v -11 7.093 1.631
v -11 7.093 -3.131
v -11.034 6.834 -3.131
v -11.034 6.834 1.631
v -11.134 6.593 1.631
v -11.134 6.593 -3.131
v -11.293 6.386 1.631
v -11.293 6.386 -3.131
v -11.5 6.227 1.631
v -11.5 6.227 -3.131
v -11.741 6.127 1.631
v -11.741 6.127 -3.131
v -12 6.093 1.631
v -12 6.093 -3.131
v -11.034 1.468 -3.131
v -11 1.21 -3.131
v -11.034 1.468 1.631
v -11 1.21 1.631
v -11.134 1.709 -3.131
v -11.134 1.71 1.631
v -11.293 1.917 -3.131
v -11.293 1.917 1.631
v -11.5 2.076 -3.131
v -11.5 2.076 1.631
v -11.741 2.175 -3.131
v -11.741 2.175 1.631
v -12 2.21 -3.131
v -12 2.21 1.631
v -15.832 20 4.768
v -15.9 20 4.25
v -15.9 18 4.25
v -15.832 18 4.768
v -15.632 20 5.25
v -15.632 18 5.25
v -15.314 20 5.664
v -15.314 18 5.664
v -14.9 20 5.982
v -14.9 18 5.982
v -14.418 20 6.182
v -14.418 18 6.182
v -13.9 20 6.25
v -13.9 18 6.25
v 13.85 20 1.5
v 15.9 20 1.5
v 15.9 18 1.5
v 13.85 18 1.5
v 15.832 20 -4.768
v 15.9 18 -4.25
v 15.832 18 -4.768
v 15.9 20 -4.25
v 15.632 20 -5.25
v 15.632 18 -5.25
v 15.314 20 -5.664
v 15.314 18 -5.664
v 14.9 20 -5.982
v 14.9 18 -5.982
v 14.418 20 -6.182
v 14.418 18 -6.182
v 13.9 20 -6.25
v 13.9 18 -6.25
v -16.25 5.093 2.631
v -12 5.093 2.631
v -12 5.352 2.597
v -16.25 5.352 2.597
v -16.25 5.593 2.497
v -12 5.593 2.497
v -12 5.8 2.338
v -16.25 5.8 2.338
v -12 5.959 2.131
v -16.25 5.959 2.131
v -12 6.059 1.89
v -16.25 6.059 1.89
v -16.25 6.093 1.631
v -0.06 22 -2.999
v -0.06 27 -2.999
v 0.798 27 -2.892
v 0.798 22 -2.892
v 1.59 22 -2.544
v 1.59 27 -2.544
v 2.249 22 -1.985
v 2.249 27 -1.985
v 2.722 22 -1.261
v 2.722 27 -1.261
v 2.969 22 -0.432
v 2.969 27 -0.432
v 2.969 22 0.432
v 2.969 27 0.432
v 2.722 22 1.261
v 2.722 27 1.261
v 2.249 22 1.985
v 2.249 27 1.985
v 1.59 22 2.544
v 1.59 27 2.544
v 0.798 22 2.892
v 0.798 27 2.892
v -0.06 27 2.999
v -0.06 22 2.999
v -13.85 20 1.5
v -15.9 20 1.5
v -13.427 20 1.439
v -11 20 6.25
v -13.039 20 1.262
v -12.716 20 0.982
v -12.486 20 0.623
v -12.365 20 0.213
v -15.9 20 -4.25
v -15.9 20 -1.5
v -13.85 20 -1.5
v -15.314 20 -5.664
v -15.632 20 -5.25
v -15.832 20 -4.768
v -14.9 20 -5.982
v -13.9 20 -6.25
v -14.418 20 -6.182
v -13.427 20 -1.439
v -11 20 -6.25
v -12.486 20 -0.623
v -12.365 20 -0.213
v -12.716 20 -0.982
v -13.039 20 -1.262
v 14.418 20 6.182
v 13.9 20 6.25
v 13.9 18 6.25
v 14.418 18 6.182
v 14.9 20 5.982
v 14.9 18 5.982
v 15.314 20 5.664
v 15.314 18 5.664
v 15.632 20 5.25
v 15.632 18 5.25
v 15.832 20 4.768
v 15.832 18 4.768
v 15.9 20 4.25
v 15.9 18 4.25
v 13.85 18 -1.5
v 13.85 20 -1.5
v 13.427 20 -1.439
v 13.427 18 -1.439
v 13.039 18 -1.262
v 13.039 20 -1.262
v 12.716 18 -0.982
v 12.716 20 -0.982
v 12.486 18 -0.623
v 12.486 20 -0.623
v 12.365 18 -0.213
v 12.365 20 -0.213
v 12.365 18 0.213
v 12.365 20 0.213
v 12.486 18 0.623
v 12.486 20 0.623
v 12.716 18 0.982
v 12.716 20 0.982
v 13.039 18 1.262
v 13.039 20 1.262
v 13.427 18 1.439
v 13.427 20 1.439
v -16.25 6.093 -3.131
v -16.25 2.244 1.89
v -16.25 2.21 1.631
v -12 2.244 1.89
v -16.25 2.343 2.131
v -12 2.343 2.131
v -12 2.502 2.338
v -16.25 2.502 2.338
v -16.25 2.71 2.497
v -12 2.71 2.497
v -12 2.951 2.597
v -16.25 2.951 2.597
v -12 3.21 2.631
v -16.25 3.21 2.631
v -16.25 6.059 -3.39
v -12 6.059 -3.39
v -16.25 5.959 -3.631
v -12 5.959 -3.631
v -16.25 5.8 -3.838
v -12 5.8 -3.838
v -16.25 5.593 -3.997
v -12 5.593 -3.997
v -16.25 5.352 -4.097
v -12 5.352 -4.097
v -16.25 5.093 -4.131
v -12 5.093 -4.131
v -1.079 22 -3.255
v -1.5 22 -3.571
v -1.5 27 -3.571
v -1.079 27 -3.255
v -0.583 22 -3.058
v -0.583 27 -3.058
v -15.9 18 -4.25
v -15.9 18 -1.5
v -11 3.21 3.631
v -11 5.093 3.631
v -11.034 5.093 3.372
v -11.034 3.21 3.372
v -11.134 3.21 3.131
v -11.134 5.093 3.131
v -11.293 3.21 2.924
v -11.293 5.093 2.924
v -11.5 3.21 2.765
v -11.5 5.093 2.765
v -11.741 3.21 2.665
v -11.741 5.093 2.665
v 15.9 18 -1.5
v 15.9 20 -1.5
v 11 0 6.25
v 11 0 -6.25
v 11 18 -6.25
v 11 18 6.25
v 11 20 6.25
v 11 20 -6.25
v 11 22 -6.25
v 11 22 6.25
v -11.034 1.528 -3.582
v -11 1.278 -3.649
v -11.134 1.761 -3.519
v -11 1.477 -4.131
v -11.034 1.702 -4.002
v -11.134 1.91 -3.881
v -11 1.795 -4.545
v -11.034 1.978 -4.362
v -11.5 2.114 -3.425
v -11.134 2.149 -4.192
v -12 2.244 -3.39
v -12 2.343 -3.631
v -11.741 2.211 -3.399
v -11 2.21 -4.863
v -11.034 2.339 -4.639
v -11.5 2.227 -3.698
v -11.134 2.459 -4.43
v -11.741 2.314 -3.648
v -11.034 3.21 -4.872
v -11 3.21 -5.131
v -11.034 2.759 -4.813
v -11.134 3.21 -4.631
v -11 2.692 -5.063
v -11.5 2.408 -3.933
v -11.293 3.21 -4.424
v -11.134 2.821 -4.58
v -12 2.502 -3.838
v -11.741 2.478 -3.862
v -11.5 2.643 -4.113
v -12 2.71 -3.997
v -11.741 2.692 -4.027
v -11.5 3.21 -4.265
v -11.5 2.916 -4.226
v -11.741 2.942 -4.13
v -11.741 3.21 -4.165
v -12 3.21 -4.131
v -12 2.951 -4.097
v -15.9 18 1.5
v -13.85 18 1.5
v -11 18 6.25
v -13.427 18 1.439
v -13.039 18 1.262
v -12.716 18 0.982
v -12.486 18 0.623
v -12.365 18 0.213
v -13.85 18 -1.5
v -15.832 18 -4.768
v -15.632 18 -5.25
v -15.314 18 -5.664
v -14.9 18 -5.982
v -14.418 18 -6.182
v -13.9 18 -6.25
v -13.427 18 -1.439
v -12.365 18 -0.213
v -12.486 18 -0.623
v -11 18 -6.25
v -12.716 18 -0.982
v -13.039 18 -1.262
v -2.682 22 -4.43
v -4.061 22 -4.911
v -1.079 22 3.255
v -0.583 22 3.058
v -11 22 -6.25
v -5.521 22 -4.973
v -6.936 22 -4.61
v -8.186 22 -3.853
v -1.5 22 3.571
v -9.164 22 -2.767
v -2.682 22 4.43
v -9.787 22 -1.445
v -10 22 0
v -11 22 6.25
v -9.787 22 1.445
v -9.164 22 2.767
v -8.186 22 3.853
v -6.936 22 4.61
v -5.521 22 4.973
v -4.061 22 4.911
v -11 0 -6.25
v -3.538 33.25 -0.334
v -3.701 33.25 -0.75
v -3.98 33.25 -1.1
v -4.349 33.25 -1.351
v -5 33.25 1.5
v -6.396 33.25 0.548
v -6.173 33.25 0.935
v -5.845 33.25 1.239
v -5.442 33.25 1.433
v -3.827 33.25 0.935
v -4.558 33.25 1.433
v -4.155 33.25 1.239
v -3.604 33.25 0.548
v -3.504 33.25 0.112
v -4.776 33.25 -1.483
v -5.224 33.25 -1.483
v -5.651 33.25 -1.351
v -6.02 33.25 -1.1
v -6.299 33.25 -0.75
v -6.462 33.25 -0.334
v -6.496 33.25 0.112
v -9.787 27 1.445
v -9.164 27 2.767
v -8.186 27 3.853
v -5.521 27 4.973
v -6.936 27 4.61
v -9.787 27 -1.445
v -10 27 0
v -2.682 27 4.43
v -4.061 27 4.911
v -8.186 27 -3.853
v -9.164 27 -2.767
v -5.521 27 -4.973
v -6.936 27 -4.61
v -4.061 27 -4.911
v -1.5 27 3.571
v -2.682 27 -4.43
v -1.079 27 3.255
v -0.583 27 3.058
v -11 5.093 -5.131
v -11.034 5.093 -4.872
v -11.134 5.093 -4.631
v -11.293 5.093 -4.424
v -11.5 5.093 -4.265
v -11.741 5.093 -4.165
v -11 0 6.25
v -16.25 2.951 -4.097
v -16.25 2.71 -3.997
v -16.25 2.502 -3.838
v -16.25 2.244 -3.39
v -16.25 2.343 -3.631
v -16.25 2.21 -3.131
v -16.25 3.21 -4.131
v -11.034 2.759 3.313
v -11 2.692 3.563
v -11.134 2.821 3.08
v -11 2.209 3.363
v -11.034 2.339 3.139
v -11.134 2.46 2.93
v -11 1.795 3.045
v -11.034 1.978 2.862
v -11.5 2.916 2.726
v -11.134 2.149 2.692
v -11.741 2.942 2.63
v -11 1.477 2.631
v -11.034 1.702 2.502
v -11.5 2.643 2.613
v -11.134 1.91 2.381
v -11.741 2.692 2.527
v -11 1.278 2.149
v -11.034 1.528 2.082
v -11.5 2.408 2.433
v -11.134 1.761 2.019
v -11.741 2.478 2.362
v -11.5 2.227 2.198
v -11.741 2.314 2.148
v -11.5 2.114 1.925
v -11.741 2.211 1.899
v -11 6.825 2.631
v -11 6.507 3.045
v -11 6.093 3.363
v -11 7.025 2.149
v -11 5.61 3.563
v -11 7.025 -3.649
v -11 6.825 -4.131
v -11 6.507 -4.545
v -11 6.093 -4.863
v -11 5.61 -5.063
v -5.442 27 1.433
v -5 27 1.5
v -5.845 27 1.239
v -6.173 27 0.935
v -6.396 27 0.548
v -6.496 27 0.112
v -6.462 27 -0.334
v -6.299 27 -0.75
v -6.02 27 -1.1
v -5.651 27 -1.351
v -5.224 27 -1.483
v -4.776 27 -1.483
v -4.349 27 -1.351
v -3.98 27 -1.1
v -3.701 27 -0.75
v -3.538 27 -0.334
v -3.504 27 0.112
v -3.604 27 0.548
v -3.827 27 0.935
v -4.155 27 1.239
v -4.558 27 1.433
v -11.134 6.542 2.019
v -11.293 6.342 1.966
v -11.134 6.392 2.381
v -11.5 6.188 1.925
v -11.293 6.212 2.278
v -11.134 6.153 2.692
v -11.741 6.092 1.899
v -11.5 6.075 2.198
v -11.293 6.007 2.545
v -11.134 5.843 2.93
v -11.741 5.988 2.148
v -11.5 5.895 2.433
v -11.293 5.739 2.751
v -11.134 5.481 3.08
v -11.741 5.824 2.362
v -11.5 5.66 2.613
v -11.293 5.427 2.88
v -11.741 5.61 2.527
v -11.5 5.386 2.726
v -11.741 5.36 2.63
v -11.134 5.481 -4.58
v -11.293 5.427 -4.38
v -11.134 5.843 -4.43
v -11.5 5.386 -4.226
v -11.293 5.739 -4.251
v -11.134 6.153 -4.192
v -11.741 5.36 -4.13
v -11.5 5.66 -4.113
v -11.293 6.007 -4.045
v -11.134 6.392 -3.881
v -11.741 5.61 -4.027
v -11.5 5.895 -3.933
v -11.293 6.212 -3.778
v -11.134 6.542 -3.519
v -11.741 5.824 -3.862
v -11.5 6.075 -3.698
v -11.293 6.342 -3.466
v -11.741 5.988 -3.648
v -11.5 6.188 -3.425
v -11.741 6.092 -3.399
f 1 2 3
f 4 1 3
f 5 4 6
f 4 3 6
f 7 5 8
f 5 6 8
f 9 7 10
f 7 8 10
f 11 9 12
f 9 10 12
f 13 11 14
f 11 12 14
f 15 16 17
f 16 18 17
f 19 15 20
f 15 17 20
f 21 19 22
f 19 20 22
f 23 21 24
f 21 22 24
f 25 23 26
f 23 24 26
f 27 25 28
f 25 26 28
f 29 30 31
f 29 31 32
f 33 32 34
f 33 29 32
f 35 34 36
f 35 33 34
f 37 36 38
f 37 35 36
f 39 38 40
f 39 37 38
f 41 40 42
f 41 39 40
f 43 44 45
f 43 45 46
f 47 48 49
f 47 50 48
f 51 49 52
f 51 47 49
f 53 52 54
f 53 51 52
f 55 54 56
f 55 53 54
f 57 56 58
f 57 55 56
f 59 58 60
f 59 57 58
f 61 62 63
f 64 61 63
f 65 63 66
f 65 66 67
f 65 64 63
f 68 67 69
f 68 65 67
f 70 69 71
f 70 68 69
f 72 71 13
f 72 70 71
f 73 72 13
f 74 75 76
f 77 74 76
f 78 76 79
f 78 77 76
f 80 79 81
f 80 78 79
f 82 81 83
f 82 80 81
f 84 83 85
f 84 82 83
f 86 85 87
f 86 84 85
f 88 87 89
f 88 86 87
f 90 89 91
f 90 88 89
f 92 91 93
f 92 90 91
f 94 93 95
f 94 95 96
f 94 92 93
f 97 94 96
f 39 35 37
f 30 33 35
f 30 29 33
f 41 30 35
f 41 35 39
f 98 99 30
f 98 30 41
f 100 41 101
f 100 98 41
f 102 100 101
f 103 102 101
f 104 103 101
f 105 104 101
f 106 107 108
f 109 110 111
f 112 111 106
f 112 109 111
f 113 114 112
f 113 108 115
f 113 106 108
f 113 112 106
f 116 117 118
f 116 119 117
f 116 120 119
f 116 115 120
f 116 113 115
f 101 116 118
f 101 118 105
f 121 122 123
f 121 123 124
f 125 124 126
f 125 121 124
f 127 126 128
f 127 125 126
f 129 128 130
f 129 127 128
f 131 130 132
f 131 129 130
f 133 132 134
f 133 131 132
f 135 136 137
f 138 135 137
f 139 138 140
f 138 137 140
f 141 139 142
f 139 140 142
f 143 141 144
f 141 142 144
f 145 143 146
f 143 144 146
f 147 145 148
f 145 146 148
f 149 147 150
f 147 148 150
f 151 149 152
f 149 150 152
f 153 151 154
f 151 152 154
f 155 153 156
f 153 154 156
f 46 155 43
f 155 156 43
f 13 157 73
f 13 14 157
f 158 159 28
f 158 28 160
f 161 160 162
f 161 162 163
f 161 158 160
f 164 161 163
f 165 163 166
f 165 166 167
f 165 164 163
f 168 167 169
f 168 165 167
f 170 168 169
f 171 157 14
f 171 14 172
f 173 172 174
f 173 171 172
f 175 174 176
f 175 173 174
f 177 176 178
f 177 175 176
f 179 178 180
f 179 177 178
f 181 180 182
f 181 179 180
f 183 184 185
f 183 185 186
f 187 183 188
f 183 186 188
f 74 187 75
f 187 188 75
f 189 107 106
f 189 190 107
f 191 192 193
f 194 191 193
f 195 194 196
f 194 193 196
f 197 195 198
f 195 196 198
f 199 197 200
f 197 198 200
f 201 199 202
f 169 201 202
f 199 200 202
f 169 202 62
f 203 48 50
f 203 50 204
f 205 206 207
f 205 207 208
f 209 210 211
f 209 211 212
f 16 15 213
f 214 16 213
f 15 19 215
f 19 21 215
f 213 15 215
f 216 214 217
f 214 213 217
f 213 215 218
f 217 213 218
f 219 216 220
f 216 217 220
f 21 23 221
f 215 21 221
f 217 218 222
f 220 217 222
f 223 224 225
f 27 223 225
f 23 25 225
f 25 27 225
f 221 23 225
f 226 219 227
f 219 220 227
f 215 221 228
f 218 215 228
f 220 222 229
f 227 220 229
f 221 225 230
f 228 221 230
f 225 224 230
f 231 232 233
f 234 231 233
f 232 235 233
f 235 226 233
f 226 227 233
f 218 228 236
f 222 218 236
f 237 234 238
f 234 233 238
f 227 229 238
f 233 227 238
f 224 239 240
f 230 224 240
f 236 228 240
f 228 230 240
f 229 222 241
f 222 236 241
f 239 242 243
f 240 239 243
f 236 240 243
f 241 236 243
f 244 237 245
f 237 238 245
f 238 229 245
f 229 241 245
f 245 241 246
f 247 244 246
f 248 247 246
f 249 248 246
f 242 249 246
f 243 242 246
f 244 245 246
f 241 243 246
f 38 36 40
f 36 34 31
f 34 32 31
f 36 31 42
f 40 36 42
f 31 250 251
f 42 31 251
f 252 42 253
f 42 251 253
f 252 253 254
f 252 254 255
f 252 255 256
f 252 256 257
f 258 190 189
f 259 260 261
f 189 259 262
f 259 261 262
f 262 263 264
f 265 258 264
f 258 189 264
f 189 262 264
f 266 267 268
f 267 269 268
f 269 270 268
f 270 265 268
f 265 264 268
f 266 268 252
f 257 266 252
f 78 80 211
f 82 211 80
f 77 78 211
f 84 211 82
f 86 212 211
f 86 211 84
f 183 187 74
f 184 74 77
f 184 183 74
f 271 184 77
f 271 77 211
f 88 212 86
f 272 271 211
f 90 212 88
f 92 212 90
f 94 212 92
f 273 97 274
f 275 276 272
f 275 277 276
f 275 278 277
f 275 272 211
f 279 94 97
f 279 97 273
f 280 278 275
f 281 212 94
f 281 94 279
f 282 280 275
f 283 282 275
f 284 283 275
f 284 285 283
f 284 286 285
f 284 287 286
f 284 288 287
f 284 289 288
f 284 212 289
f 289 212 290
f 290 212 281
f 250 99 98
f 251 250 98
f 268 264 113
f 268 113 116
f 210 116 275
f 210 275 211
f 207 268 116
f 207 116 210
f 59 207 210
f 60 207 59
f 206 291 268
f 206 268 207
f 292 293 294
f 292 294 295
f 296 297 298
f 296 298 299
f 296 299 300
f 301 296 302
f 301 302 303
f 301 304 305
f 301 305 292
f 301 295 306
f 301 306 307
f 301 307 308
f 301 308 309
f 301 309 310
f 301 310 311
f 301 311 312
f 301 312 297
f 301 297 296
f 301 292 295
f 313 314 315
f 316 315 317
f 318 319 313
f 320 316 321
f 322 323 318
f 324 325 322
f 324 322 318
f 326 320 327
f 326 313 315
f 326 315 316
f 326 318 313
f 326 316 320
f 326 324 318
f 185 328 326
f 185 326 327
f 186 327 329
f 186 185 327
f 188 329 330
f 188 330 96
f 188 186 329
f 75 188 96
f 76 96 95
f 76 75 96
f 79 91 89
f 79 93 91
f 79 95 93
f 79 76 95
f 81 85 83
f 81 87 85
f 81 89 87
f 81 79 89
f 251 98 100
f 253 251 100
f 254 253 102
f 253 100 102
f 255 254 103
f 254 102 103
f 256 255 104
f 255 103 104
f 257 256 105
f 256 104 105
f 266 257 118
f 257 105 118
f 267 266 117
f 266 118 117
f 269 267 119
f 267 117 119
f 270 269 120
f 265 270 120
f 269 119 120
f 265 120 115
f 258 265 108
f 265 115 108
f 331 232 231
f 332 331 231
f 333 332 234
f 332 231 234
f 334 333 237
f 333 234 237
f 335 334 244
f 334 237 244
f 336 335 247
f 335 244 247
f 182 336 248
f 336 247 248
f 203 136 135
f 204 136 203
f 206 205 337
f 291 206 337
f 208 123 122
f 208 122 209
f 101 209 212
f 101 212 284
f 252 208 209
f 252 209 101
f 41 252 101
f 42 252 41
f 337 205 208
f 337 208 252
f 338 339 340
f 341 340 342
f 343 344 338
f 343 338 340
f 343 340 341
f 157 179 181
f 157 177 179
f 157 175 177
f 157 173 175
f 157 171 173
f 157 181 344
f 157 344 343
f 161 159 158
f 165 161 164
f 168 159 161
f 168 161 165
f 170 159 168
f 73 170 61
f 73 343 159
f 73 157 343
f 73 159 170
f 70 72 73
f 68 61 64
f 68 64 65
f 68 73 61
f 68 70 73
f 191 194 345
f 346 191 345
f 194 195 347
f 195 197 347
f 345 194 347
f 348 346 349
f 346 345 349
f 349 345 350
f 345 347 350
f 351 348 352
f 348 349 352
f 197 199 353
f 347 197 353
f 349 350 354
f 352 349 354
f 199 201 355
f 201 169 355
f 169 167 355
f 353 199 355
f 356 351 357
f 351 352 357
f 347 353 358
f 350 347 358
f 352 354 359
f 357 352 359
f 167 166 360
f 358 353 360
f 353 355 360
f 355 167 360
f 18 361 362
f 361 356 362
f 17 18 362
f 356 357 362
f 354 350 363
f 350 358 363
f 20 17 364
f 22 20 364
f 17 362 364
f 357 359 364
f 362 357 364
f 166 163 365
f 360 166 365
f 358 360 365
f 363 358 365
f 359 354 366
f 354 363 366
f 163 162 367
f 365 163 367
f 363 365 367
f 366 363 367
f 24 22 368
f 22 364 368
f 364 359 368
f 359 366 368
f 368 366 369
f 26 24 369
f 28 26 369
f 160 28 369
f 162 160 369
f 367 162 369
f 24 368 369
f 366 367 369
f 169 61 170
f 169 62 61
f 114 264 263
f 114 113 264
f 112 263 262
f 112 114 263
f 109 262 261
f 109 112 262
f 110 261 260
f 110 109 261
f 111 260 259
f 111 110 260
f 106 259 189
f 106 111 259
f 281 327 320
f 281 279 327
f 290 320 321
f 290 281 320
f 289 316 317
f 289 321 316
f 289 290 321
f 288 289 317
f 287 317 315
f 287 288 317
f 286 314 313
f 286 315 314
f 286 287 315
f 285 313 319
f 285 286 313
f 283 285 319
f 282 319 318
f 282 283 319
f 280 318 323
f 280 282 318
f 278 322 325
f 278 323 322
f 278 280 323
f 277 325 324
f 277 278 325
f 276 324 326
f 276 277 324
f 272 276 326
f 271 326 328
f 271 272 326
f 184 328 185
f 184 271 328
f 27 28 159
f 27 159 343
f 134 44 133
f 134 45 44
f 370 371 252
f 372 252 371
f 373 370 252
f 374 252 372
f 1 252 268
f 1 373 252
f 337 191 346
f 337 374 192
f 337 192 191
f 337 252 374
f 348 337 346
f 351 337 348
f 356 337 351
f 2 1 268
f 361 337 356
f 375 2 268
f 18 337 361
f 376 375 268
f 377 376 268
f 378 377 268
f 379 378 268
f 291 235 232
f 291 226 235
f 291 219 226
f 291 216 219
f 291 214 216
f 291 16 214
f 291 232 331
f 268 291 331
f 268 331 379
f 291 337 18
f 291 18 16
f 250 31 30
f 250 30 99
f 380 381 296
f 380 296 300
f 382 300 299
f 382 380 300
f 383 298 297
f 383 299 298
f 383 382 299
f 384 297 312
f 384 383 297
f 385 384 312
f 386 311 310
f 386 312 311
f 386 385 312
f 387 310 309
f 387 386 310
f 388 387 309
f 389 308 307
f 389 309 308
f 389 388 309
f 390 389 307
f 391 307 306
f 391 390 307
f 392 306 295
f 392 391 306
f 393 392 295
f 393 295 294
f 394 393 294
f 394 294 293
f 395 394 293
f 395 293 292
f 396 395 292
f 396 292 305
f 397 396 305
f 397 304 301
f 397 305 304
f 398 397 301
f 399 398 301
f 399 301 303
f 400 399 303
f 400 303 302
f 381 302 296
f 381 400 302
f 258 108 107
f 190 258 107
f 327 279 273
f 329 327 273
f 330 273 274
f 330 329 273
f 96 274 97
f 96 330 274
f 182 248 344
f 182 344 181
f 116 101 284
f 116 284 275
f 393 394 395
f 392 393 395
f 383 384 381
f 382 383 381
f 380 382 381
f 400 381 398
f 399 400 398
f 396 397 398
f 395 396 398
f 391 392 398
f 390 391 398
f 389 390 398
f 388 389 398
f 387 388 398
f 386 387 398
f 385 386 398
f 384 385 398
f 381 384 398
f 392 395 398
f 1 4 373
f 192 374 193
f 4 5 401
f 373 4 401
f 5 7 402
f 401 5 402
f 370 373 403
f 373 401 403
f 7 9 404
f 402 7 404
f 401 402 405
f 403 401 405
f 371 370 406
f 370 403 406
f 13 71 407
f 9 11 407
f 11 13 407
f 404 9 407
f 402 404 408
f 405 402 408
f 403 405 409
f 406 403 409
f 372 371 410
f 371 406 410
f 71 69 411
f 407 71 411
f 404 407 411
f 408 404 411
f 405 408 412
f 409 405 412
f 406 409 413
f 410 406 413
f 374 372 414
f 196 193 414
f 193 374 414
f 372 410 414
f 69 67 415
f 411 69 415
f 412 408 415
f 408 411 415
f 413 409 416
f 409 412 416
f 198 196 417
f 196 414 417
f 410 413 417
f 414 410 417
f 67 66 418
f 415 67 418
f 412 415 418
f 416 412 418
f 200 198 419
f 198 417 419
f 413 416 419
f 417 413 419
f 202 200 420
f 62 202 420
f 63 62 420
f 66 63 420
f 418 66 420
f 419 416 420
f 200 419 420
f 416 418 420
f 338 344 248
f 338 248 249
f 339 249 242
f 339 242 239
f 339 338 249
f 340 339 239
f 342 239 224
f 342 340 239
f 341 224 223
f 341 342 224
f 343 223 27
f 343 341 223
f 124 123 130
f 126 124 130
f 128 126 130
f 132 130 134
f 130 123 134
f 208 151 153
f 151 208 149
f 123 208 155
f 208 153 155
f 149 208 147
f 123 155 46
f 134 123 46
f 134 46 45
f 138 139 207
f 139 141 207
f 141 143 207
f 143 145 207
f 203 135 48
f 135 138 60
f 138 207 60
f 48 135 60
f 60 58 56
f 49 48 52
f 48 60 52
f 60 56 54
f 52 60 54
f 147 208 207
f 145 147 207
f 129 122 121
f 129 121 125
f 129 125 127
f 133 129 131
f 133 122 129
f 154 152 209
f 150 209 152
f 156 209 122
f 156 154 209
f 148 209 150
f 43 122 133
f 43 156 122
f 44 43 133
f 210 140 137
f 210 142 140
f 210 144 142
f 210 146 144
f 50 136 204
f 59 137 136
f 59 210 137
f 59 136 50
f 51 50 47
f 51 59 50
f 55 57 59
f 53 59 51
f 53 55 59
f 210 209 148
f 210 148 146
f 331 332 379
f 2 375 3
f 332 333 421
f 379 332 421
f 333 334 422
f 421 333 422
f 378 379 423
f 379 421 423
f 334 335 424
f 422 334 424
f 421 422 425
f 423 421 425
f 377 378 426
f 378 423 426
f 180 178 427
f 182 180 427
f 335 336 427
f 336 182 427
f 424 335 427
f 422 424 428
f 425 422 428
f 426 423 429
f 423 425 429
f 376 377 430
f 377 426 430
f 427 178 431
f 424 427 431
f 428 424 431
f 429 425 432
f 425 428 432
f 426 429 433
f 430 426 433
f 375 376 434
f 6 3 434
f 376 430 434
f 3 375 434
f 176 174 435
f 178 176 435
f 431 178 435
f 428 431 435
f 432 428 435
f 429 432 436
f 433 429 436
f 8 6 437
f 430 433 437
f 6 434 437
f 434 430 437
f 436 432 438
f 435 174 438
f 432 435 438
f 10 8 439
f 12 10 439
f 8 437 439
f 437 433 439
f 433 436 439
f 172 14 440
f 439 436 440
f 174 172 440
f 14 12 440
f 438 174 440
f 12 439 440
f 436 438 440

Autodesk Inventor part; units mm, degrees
ref_plane "YZ Plane" through (0, 0, 0) normal (1, 0, 0) x (0, 1, 0)
ref_plane "XZ Plane" through (0, 0, 0) normal (0, 1, 0) x (-1, 0, 0)
sketch "Skizze1" plane through (0, 0, 0) normal (0, 1, 0) x (-1, 0, 0)
  line L0 (-11, 6.25) -> (11, 6.25)
  line L1 (11, 6.25) -> (11, -6.25)
  line L2 (11, -6.25) -> (-11, -6.25)
  line L3 (-11, -6.25) -> (-11, 6.25)
  line L4 (-11, 6.25) -> (11, -6.25) construction
  line L5 (11, 6.25) -> (-11, -6.25) construction
  point P0 (0, 0)
  dimension "d0" = 22
  dimension "d1" = 12.5
extrude "Extrusion1" add sketch "Skizze1" along normal blind 22
ref_plane "Arbeitsebene1" through (0, 18, 0) normal (0, 1, 0) x (1, 0, 0)
sketch "Skizze2" plane through (0, 18, 0) normal (0, 1, 0) x (1, 0, 0)
  line L0 (15.9, -6.25) -> (-15.9, -6.25)
  line L1 (-15.9, -6.25) -> (-15.9, 6.25)
  line L2 (-15.9, 6.25) -> (15.9, 6.25)
  line L3 (15.9, 6.25) -> (15.9, -6.25)
  line L4 (15.9, -6.25) -> (-15.9, 6.25) construction
  line L5 (-15.9, -6.25) -> (15.9, 6.25) construction
  line L6 (11, 6.25) -> (-11, 6.25) projected
  point P0 (0, 0)
  dimension "d4" = 31.8
extrude "Extrusion2" add sketch "Skizze2" along normal blind 2
fillet "Rundung1" radius 2 4 edges at (-15.9, 19, 6.25) (15.9, 19, 6.25) (15.9, 19, -6.25) (-15.9, 19, -6.25)
sketch "Skizze3" plane through (0, 22, 0) normal (0, 1, 0) x (1, 0, 0)
  circle A0 centre (-5, 0) radius 5
  circle A1 centre (0, 0) radius 3
  line L0 (-11, 6.25) -> (-11, -6.25) projected
  point P0 (-0.9, -2.8618)
  point P1 (-0.9, 2.8618)
  dimension "d9" = 10
  dimension "d29" = 6
  dimension "d30" = 6
extrude "Extrusion3" add sketch "Skizze3" along normal blind 5
sketch "Skizze5" plane through (0, 22, 0) normal (0, 1, 0) x (1, 0, 0)
  line L0 (15.35, 1.5) -> (16.45, 1.5)
  line L1 (16.45, 1.5) -> (16.45, -1.5)
  line L2 (16.45, -1.5) -> (15.35, -1.5)
  line L3 (15.35, -1.5) -> (15.35, 1.5)
  line L4 (15.9, -4.25) -> (15.9, 4.25) projected
  line L5 (15.35, 1.5) -> (16.45, -1.5) construction
  line L6 (16.45, 1.5) -> (15.35, -1.5) construction
  line L7 (-15.35, 1.5) -> (-16.45, 1.5)
  line L8 (-16.45, 1.5) -> (-16.45, -1.5)
  line L9 (-16.45, -1.5) -> (-15.35, -1.5)
  line L10 (-15.35, -1.5) -> (-15.35, 1.5)
  line L11 (-15.9, 4.25) -> (-15.9, -4.25) projected
  line L12 (-15.35, 1.5) -> (-16.45, -1.5) construction
  line L13 (-16.45, 1.5) -> (-15.35, -1.5) construction
  circle A0 centre (-13.85, 0) radius 1.5
  circle A1 centre (13.85, 0) radius 1.5
  line L14 (13.85, 0) -> (-13.85, 0) construction
  line L15 (0, 0) -> (0, -6.25) construction
  line L16 (-11, -6.25) -> (11, -6.25) projected
  line L17 (15.35, -1.5) -> (13.85, -1.5)
  line L18 (13.85, 1.5) -> (15.35, 1.5)
  line L19 (-13.85, -1.5) -> (-15.35, -1.5)
  line L20 (-13.85, 1.5) -> (-15.35, 1.5)
  point P0 (15.9, 0)
  point P1 (-15.9, 0)
  dimension "d15" = 3
  dimension "d16" = 3
  dimension "d27" = 27.7
  dimension "d32" = 13.85
extrude "Extrusion5" cut sketch "Skizze5" against normal blind 5.5
sketch "Skizze4" plane through (-5, 27, 0) normal (0, 1, 0) x (0, 0, 1)
  circle A0 centre (0, 0) radius 1.5
  arc A1 (-2.8618, 4.1) -> (2.8618, 4.1) centre (0, 0) ccw projected
  point P0 (0, 5)
  dimension "d12" = 3
extrude "Extrusion4" add sketch "Skizze4" along normal blind 6.25 separate body
sketch "Skizze6" plane through (-11, 0, -6.25) normal (-1, 0, 0) x (0, 0, 1)
  line L0 (2.1189, 6.0927) -> (8.8811, 6.0927)
  line L1 (8.8811, 6.0927) -> (8.8811, 2.2095)
  line L2 (8.8811, 2.2095) -> (2.1189, 2.2095)
  line L3 (2.1189, 2.2095) -> (2.1189, 6.0927)
  line L4 (2.1189, 6.0927) -> (8.8811, 2.2095) construction
  line L5 (8.8811, 6.0927) -> (2.1189, 2.2095) construction
  point P0 (6.25, 0)
  point P1 (5.5, 4.1511)
extrude "Extrusion6" add sketch "Skizze6" along normal blind 5.25 bodies 1
fillet "Rundung3" radius 1 4 edges at (-13.625, 6.0927, -4.1311) (-13.625, 2.2095, -4.1311) (-13.625, 2.2095, 2.6311) (-13.625, 6.0927, 2.6311)
fillet "Rundung4" radius 1 8 edges at (-11, 5.7998, 2.3382) (-11, 4.1511, 2.6311) (-11, 2.5023, 2.3382) (-11, 2.2095, -0.75) (-11, 2.5023, -3.8382) (-11, 4.1511, -4.1311) (-11, 5.7998, -3.8382) (-11, 6.0927, -0.75)
fillet "Rundung5" radius 2 2 edges at (-0.9, 24.5, 2.8618) (-0.9, 24.5, -2.8618)
properties part number "P_Servo_SIMPROP_27x12"
